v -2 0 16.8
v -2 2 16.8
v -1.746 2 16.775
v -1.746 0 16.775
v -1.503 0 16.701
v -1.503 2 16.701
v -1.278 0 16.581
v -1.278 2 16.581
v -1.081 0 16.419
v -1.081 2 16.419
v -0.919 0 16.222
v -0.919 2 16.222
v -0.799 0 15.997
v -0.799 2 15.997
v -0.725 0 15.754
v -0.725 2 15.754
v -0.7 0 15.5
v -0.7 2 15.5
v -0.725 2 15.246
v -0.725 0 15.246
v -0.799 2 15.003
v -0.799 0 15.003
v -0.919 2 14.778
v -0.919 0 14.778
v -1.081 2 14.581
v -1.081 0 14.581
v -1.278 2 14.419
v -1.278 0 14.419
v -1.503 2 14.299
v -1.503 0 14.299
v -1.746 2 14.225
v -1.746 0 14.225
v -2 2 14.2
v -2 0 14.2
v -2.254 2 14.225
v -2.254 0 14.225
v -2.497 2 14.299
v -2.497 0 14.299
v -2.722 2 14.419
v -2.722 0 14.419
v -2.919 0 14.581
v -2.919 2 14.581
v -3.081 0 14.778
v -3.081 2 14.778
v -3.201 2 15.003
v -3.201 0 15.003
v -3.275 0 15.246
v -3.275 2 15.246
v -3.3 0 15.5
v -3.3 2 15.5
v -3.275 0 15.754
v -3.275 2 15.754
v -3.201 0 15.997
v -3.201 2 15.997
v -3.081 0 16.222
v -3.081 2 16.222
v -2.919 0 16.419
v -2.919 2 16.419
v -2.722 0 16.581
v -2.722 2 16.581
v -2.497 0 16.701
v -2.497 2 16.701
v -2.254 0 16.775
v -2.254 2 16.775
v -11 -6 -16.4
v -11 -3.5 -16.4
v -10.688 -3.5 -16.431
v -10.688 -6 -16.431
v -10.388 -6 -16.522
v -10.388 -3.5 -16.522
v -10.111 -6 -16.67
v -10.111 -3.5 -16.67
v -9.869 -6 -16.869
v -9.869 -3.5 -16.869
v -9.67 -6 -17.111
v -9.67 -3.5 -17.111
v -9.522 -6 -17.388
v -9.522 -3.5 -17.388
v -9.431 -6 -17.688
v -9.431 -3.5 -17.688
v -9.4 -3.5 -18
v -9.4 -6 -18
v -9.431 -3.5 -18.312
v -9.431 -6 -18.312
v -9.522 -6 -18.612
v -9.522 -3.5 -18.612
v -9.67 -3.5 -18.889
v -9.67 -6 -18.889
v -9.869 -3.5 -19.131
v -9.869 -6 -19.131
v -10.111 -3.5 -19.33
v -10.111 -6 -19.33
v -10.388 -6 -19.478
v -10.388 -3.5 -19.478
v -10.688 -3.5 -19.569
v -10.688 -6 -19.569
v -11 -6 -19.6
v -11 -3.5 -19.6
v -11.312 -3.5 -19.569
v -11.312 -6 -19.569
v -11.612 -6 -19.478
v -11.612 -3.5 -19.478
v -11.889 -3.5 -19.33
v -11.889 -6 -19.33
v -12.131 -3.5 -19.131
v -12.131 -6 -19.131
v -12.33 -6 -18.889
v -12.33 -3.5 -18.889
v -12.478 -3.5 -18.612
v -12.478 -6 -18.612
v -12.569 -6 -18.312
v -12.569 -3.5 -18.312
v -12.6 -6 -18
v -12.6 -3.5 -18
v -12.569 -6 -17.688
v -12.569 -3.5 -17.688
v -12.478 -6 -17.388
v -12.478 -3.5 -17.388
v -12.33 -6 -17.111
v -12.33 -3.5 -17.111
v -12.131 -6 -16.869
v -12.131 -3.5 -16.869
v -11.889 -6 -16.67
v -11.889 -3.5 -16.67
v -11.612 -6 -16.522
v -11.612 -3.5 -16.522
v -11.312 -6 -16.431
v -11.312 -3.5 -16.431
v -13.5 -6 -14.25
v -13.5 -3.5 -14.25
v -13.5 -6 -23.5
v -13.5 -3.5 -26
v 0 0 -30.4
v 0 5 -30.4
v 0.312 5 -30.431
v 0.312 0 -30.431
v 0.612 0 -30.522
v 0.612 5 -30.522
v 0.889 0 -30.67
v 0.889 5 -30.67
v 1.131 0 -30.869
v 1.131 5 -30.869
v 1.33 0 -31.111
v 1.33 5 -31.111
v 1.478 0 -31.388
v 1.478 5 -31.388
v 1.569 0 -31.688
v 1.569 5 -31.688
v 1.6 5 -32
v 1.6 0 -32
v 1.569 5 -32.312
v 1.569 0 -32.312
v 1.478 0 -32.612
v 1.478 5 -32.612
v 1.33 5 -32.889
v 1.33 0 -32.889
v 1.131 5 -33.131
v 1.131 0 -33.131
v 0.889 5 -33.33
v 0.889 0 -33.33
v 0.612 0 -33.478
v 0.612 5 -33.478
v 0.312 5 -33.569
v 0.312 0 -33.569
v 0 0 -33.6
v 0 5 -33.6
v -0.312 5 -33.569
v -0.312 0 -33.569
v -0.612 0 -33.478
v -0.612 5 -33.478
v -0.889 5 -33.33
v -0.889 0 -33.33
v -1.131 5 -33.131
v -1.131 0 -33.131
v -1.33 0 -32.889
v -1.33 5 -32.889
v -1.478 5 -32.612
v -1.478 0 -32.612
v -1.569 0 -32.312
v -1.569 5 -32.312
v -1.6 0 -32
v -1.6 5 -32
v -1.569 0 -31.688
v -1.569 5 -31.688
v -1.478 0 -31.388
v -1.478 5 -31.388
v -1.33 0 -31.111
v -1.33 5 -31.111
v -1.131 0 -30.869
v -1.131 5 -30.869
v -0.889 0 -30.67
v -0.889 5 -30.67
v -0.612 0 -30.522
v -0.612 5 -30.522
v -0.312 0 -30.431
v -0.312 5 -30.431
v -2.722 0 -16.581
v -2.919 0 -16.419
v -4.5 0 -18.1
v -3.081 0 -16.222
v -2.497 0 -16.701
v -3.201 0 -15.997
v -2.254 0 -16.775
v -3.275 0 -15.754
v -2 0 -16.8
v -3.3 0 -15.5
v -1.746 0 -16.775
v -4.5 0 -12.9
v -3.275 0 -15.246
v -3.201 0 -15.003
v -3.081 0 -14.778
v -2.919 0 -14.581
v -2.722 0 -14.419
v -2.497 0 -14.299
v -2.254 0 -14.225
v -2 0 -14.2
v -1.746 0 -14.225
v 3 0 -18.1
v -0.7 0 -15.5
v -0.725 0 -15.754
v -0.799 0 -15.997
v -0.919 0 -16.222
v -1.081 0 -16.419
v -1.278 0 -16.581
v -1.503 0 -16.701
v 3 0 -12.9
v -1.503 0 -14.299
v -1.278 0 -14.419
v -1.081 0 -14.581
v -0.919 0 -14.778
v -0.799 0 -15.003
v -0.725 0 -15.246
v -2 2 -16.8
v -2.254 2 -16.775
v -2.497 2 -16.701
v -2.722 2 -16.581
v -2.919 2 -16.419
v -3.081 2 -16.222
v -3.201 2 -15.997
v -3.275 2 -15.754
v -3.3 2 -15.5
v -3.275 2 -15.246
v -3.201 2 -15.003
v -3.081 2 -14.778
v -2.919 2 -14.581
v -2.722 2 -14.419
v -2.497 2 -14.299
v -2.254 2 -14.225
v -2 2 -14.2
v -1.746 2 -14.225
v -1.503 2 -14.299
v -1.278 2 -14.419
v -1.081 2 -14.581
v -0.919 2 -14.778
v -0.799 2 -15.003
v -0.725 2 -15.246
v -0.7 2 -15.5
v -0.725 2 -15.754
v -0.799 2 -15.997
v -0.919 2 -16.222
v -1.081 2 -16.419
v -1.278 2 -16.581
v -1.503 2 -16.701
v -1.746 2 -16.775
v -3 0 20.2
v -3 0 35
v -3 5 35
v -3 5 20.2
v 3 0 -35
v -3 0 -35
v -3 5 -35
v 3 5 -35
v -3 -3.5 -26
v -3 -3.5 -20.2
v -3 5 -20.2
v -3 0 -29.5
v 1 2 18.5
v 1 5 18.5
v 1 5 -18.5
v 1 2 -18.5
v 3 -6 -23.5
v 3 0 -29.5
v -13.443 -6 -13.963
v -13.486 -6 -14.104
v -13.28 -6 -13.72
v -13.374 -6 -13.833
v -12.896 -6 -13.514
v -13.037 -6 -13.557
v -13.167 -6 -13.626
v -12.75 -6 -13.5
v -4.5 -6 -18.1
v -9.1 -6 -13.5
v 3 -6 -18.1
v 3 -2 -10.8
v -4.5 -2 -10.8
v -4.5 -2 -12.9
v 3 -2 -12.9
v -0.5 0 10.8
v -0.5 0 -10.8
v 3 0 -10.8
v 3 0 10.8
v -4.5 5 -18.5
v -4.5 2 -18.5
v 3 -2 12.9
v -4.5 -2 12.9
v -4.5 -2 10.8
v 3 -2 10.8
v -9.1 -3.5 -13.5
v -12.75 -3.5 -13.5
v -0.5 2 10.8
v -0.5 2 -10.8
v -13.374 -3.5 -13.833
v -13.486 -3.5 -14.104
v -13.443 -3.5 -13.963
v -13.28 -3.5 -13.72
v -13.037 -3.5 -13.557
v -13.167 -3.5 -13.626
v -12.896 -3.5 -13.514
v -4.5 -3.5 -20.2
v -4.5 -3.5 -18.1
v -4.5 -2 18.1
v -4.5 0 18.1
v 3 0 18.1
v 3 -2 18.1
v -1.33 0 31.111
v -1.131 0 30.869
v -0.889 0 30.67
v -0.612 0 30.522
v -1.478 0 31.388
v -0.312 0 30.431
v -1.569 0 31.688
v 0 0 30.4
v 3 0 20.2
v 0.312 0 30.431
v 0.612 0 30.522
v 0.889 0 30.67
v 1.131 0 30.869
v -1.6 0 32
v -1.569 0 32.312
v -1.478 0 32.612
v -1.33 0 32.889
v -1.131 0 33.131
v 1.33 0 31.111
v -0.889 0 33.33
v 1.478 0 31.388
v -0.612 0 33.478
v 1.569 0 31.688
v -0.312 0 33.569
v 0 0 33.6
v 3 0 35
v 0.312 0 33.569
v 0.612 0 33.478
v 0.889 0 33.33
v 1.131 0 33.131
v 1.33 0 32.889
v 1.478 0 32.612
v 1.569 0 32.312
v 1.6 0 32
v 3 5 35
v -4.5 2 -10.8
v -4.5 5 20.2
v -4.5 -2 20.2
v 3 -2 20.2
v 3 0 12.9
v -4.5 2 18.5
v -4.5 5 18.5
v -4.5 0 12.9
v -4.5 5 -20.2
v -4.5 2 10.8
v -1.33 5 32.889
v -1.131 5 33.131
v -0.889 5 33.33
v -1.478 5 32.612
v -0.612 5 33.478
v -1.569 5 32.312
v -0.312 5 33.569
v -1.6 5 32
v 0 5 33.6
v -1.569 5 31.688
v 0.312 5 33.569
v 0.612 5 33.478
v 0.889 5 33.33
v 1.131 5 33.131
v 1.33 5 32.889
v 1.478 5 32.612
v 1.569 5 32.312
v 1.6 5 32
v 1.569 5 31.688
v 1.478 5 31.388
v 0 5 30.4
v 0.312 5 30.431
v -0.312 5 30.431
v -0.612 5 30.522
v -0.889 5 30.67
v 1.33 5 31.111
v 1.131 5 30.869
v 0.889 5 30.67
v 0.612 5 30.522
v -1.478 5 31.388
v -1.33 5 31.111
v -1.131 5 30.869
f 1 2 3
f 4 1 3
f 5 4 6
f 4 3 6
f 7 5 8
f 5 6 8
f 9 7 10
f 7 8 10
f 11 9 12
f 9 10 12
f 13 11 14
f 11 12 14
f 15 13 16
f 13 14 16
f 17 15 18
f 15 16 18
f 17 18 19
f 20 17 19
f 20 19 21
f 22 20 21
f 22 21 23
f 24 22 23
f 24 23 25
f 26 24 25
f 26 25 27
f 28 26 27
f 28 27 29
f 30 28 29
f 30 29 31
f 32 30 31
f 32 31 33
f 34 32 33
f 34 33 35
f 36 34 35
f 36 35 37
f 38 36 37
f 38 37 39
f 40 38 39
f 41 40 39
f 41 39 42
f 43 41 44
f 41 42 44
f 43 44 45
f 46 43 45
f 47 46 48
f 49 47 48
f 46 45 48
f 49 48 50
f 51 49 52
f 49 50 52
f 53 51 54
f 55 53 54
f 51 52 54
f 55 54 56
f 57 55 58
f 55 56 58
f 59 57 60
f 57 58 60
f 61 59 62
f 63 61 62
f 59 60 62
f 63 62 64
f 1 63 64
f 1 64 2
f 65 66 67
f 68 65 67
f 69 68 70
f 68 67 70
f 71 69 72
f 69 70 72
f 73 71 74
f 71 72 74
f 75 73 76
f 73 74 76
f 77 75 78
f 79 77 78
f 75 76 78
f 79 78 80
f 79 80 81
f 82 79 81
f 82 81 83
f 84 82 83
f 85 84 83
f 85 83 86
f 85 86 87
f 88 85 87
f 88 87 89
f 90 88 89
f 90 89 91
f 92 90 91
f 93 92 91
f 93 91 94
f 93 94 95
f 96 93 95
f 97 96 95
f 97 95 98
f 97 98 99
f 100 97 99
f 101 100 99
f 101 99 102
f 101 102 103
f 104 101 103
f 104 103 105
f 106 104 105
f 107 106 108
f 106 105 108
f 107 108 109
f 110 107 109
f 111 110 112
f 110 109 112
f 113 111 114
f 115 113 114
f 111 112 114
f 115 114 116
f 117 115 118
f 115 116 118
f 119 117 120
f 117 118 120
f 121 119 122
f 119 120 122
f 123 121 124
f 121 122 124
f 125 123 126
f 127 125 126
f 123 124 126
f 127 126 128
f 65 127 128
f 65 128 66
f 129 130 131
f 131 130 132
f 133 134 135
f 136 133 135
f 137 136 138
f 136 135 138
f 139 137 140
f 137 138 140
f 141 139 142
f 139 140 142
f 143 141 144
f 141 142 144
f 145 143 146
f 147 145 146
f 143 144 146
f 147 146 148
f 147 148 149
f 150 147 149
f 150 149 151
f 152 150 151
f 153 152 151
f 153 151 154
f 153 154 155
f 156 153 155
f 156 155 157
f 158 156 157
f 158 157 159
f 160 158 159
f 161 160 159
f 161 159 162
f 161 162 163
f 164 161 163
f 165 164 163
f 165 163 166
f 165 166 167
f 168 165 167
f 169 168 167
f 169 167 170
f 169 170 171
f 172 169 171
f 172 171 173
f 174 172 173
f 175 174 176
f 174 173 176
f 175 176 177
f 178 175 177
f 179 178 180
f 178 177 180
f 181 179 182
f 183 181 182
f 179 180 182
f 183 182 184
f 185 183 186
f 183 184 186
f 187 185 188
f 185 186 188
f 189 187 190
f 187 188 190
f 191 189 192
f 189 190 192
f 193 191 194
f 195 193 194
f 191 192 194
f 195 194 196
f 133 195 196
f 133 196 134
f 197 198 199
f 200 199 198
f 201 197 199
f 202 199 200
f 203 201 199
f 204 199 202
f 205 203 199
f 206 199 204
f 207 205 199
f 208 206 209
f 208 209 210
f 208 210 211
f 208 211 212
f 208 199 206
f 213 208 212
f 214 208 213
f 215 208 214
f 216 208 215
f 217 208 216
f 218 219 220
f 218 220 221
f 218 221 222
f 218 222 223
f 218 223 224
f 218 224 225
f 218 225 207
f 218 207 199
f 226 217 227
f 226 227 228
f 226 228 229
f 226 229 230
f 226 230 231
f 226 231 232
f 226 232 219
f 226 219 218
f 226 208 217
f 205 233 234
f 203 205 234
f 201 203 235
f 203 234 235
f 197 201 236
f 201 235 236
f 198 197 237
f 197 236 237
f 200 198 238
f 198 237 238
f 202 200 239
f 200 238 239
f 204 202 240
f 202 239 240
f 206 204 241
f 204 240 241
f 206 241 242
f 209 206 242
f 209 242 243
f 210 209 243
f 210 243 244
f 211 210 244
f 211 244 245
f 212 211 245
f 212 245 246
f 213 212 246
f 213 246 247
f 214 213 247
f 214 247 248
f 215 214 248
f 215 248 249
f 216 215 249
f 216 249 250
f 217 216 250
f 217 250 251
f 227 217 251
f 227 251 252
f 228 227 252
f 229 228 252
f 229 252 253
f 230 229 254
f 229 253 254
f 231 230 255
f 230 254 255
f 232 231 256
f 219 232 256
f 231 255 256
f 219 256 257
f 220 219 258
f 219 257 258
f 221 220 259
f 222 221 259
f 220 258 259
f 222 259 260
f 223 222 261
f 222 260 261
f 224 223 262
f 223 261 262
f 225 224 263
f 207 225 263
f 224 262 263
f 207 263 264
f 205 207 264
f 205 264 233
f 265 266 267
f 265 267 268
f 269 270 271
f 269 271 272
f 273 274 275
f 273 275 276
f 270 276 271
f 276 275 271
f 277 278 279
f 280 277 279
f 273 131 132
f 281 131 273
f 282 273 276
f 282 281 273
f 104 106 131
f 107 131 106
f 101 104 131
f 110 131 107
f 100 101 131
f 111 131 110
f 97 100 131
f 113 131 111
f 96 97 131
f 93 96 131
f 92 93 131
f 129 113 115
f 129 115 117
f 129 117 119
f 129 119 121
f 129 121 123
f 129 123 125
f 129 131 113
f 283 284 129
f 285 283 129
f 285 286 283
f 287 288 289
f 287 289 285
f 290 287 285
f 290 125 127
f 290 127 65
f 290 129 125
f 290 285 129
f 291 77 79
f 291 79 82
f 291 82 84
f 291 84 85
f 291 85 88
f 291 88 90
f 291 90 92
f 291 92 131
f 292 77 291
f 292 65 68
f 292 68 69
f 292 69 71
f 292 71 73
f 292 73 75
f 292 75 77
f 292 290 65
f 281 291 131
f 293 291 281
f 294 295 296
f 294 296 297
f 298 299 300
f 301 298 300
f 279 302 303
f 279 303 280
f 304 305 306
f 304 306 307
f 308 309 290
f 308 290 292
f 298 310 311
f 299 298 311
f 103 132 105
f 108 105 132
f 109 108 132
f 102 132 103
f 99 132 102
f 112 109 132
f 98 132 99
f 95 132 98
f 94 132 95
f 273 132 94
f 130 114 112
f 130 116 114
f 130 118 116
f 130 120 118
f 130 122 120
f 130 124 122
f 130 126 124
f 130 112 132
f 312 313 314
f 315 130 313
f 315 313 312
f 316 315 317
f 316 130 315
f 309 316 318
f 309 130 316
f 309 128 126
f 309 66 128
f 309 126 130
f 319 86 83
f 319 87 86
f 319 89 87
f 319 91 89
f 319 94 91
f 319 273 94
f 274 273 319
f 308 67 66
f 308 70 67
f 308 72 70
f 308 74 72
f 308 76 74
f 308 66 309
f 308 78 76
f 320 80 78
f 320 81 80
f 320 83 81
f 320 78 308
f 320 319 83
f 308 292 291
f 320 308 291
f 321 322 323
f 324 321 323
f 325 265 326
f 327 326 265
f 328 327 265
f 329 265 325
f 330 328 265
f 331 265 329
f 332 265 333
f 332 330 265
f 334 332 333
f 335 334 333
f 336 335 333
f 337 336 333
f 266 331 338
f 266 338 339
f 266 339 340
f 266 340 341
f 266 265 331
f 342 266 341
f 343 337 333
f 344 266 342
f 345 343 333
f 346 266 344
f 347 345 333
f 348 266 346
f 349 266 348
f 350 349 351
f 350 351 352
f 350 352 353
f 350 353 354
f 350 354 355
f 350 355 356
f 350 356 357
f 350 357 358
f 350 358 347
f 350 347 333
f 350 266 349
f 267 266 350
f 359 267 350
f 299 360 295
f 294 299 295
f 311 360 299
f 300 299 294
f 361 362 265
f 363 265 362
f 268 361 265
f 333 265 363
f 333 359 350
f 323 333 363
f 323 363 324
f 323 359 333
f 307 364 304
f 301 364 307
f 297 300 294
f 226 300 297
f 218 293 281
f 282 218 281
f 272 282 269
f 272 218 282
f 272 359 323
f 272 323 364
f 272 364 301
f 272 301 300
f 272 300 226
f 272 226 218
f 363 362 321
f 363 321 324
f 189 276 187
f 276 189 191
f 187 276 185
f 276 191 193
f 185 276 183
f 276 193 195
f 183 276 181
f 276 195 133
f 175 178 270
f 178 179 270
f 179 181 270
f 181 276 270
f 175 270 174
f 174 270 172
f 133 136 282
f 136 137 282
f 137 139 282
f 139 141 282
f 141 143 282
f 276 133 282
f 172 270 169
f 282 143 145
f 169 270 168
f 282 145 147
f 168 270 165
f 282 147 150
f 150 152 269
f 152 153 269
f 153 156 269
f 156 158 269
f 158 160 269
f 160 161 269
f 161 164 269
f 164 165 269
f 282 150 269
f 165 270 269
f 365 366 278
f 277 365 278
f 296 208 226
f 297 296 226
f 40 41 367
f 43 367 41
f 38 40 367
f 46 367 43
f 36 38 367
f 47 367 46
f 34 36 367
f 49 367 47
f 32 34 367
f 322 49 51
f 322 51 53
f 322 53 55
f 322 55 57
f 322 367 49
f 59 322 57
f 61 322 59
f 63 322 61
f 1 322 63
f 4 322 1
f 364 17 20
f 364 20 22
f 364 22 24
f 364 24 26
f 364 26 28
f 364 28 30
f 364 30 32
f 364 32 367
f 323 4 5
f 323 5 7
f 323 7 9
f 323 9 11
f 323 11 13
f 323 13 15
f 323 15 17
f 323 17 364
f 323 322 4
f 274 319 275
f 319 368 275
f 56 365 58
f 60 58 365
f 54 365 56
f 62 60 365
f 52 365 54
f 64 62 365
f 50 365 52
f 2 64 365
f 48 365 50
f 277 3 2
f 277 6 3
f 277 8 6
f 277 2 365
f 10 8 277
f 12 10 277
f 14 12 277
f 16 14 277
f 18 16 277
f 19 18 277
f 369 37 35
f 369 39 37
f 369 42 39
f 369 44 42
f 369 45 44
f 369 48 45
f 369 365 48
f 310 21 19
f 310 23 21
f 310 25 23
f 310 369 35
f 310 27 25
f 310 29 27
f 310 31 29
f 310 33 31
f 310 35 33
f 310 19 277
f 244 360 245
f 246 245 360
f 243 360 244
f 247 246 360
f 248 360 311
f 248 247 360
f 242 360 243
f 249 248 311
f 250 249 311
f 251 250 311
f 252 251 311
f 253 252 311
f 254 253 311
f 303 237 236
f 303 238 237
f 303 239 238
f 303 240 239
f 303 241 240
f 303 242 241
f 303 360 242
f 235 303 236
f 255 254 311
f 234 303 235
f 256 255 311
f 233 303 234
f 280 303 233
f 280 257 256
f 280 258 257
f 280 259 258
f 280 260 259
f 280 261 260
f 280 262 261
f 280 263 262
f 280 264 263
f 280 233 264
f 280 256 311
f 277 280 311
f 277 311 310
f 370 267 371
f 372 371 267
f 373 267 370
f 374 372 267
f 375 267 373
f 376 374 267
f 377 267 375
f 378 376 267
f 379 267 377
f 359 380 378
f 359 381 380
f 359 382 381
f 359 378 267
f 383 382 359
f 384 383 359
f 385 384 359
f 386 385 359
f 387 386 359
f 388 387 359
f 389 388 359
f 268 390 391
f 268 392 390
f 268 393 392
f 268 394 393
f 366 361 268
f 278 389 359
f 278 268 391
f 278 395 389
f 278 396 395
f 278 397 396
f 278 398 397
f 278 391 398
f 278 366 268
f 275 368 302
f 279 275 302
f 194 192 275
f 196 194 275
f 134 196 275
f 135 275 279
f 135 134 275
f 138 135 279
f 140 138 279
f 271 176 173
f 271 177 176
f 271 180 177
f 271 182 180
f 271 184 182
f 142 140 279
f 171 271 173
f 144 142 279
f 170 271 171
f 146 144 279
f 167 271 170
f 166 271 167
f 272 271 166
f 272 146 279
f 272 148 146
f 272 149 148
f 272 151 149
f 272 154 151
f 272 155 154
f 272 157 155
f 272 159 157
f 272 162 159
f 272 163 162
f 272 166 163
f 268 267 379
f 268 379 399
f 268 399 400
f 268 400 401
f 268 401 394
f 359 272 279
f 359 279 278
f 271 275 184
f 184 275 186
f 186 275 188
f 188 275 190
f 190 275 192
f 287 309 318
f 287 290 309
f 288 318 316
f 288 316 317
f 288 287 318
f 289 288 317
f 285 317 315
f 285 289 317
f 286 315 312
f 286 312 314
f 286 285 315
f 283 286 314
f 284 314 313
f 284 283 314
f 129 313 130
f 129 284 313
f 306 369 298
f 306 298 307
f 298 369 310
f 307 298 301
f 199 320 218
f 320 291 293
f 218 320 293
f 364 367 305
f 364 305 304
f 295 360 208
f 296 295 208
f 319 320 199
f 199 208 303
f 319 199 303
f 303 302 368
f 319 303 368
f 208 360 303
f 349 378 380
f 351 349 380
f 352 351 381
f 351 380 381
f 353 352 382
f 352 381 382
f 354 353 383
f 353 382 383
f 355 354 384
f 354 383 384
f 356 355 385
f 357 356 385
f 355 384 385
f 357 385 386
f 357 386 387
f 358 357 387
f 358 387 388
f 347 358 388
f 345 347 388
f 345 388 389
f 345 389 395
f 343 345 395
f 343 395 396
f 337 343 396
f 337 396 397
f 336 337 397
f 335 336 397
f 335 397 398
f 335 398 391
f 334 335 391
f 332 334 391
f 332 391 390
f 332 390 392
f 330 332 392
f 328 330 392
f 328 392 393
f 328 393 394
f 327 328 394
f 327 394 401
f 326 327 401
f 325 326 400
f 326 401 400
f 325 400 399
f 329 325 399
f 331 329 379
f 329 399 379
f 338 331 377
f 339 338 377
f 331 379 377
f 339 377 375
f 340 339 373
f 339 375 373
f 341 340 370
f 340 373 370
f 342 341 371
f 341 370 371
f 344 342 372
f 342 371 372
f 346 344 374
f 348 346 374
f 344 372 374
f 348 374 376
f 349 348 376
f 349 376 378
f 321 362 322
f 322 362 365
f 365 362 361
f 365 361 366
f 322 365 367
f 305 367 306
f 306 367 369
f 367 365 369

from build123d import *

# Parameters (mm, degrees)
SKETCH1_W           = 6
SKETCH1_H           = 70
BOSS_EXTRUDE1_DEPTH = 5
SKETCH2_R           = 1.6
CUT_EXTRUDE1_DEPTH  = 36.482389998
SKETCH5_W           = 1.5
SKETCH5_H           = 40.4
BOSS_EXTRUDE2_DEPTH = 5
SKETCH7_W           = 14.889639403
SKETCH7_H           = 37
CUT_EXTRUDE5_DEPTH  = 3
SKETCH8_W           = 4
SKETCH8_H           = 21.6
CUT_EXTRUDE6_DEPTH  = 3
SKETCH9_W           = 16.5
SKETCH9_H           = 10
BOSS_EXTRUDE3_DEPTH = 6
SKETCH6_R           = 1.3
CUT_EXTRUDE4_DEPTH  = 40.092838219
SKETCH10_R          = 1.6
CUT_EXTRUDE7_DEPTH  = 9
CUT_EXTRUDE8_DEPTH  = 3.5
BOSS_EXTRUDE4_DEPTH = 6
CUT_EXTRUDE10_REACH = 41.093
BOSS_EXTRUDE5_DEPTH = 10.5
FILLET3_R           = 0.75
SKETCH16_W          = 7.5
SKETCH16_H          = 2.1
BOSS_EXTRUDE6_DEPTH = 2


with BuildPart() as part:
    # Sketch1 → Boss-Extrude1 (new body)
    with BuildSketch(Plane(origin=(0, 0, 0), x_dir=(1, 0, 0), z_dir=(0, 1, 0))):
        Rectangle(SKETCH1_W, SKETCH1_H)
    extrude(amount=BOSS_EXTRUDE1_DEPTH)

    # Sketch2 → Cut-Extrude1 (cut, through all)
    with BuildSketch(Plane(origin=(0, 5, 0), x_dir=(1, 0, 0), z_dir=(0, 1, 0))):
        with Locations(Location((0, -32, 0), (0, 0, 270))):
            Circle(SKETCH2_R)
        with Locations(Location((0, 32, 0), (0, 0, 270))):
            Circle(SKETCH2_R)
    extrude(amount=-CUT_EXTRUDE1_DEPTH, mode=Mode.SUBTRACT)

    # Sketch5 → Boss-Extrude2 (add)
    with BuildSketch(Plane(origin=(0, 5, 0), x_dir=(1, 0, 0), z_dir=(0, 1, 0))):
        with Locations((-3.75, 0)):
            Rectangle(SKETCH5_W, SKETCH5_H)
    extrude(amount=-BOSS_EXTRUDE2_DEPTH)

    # Sketch7 → Cut-Extrude5 (cut)
    with BuildSketch(Plane(origin=(0, 5, 0), x_dir=(1, 0, 0), z_dir=(0, 1, 0))):
        with Locations((-6.444819702, 0)):
            Rectangle(SKETCH7_W, SKETCH7_H)
    extrude(amount=-CUT_EXTRUDE5_DEPTH, mode=Mode.SUBTRACT)

    # Sketch8 → Cut-Extrude6 (cut)
    with BuildSketch(Plane(origin=(0, 2, 0), x_dir=(1, 0, 0), z_dir=(0, 1, 0))):
        with Locations((-2.5, 0)):
            Rectangle(SKETCH8_W, SKETCH8_H)
    extrude(amount=-CUT_EXTRUDE6_DEPTH, mode=Mode.SUBTRACT)

    # Sketch9 → Boss-Extrude3 (add)
    with BuildSketch(Plane.XZ):
        with Locations((-5.25, -18.5)):
            Rectangle(SKETCH9_W, SKETCH9_H)
    extrude(amount=BOSS_EXTRUDE3_DEPTH)

    # Sketch6 → Cut-Extrude4 (cut, through all)
    with BuildSketch(Plane(origin=(0, 5, 0), x_dir=(1, 0, 0), z_dir=(0, 1, 0))):
        with Locations(Location((-2, 15.5, 0), (0, 0, 90))):
            Circle(SKETCH6_R)
        with Locations(Location((-2, -15.5, 0), (0, 0, 270))):
            Circle(SKETCH6_R)
    extrude(amount=-CUT_EXTRUDE4_DEPTH, mode=Mode.SUBTRACT)

    # Sketch10 → Cut-Extrude7 (cut)
    with BuildSketch(Plane(origin=(0, 0, 0), x_dir=(1, 0, 0), z_dir=(0, 1, 0))):
        with Locations(Location((-11, 18, 0), (0, 0, 270))):
            Circle(SKETCH10_R)
    extrude(amount=-CUT_EXTRUDE7_DEPTH, mode=Mode.SUBTRACT)

    # Sketch11 → Cut-Extrude8 (cut)
    with BuildSketch(Plane(origin=(0, 0, 0), x_dir=(1, 0, 0), z_dir=(0, 1, 0))):
        Polygon((-13.5, 13.5), (-4.5, 13.5), (-4.5, 20.2), (-3, 20.2), (-3, 23.5), (-13.5, 23.5), align=None)
    extrude(amount=-CUT_EXTRUDE8_DEPTH, mode=Mode.SUBTRACT)

    # Sketch13 → Boss-Extrude4 (add)
    with BuildSketch(Plane(origin=(3, 0, 0), x_dir=(0, 0, -1), z_dir=(1, 0, 0))):
        Polygon((23.5, -6), (29.5, 0), (23.5, 0), align=None)
    extrude(amount=-BOSS_EXTRUDE4_DEPTH)

    # Cut-Extrude10: up to this face of the body (flat: up to its plane)
    cut_extrude10_end = Plane(part.part.faces().sort_by_distance((0.153252085, 0, 12.233088701))[0])
    # Sketch14 → Cut-Extrude10 (cut, up to the picked face)
    with BuildSketch(Plane.XZ.offset(6), mode=Mode.PRIVATE) as cut_extrude10_sk1:
        Polygon((-4.5, -18.1), (5.195583007, -18.1), (5.195583007, -13.5), (-9.1, -13.5), align=None)
    cut_extrude10_tool1 = split(extrude(cut_extrude10_sk1.sketch, amount=-CUT_EXTRUDE10_REACH, mode=Mode.PRIVATE), bisect_by=cut_extrude10_end, keep=Keep.BOTH, mode=Mode.PRIVATE)
    add(cut_extrude10_tool1.solids().sort_by(Axis((-0.875708, -6, -15.653001), (0, 1, 0)))[0], mode=Mode.SUBTRACT)

    # Sketch15 → Boss-Extrude5 (add)
    with BuildSketch(Plane.ZY.offset(3)):
        Polygon((-23.5, -3.5), (-23.5, -6), (-26, -3.5), align=None)
    extrude(amount=BOSS_EXTRUDE5_DEPTH)

    # Fillet3
    fillet3_edges = [part.edges().sort_by_distance(p)[0] for p in [
        (-13.5, -4.75, -13.5),
    ]]
    fillet(fillet3_edges, radius=FILLET3_R)

    # Sketch16 → Boss-Extrude6 (add)
    with BuildSketch(Plane.XZ):
        with Locations((-0.75, -19.15)):
            Rectangle(SKETCH16_W, SKETCH16_H)
        with Locations((-0.75, -11.85)):
            Rectangle(SKETCH16_W, SKETCH16_H)
        with Locations((-0.75, 11.85)):
            Rectangle(SKETCH16_W, SKETCH16_H)
        with Locations((-0.75, 19.15)):
            Rectangle(SKETCH16_W, SKETCH16_H)
    extrude(amount=BOSS_EXTRUDE6_DEPTH)


solid = part.part
